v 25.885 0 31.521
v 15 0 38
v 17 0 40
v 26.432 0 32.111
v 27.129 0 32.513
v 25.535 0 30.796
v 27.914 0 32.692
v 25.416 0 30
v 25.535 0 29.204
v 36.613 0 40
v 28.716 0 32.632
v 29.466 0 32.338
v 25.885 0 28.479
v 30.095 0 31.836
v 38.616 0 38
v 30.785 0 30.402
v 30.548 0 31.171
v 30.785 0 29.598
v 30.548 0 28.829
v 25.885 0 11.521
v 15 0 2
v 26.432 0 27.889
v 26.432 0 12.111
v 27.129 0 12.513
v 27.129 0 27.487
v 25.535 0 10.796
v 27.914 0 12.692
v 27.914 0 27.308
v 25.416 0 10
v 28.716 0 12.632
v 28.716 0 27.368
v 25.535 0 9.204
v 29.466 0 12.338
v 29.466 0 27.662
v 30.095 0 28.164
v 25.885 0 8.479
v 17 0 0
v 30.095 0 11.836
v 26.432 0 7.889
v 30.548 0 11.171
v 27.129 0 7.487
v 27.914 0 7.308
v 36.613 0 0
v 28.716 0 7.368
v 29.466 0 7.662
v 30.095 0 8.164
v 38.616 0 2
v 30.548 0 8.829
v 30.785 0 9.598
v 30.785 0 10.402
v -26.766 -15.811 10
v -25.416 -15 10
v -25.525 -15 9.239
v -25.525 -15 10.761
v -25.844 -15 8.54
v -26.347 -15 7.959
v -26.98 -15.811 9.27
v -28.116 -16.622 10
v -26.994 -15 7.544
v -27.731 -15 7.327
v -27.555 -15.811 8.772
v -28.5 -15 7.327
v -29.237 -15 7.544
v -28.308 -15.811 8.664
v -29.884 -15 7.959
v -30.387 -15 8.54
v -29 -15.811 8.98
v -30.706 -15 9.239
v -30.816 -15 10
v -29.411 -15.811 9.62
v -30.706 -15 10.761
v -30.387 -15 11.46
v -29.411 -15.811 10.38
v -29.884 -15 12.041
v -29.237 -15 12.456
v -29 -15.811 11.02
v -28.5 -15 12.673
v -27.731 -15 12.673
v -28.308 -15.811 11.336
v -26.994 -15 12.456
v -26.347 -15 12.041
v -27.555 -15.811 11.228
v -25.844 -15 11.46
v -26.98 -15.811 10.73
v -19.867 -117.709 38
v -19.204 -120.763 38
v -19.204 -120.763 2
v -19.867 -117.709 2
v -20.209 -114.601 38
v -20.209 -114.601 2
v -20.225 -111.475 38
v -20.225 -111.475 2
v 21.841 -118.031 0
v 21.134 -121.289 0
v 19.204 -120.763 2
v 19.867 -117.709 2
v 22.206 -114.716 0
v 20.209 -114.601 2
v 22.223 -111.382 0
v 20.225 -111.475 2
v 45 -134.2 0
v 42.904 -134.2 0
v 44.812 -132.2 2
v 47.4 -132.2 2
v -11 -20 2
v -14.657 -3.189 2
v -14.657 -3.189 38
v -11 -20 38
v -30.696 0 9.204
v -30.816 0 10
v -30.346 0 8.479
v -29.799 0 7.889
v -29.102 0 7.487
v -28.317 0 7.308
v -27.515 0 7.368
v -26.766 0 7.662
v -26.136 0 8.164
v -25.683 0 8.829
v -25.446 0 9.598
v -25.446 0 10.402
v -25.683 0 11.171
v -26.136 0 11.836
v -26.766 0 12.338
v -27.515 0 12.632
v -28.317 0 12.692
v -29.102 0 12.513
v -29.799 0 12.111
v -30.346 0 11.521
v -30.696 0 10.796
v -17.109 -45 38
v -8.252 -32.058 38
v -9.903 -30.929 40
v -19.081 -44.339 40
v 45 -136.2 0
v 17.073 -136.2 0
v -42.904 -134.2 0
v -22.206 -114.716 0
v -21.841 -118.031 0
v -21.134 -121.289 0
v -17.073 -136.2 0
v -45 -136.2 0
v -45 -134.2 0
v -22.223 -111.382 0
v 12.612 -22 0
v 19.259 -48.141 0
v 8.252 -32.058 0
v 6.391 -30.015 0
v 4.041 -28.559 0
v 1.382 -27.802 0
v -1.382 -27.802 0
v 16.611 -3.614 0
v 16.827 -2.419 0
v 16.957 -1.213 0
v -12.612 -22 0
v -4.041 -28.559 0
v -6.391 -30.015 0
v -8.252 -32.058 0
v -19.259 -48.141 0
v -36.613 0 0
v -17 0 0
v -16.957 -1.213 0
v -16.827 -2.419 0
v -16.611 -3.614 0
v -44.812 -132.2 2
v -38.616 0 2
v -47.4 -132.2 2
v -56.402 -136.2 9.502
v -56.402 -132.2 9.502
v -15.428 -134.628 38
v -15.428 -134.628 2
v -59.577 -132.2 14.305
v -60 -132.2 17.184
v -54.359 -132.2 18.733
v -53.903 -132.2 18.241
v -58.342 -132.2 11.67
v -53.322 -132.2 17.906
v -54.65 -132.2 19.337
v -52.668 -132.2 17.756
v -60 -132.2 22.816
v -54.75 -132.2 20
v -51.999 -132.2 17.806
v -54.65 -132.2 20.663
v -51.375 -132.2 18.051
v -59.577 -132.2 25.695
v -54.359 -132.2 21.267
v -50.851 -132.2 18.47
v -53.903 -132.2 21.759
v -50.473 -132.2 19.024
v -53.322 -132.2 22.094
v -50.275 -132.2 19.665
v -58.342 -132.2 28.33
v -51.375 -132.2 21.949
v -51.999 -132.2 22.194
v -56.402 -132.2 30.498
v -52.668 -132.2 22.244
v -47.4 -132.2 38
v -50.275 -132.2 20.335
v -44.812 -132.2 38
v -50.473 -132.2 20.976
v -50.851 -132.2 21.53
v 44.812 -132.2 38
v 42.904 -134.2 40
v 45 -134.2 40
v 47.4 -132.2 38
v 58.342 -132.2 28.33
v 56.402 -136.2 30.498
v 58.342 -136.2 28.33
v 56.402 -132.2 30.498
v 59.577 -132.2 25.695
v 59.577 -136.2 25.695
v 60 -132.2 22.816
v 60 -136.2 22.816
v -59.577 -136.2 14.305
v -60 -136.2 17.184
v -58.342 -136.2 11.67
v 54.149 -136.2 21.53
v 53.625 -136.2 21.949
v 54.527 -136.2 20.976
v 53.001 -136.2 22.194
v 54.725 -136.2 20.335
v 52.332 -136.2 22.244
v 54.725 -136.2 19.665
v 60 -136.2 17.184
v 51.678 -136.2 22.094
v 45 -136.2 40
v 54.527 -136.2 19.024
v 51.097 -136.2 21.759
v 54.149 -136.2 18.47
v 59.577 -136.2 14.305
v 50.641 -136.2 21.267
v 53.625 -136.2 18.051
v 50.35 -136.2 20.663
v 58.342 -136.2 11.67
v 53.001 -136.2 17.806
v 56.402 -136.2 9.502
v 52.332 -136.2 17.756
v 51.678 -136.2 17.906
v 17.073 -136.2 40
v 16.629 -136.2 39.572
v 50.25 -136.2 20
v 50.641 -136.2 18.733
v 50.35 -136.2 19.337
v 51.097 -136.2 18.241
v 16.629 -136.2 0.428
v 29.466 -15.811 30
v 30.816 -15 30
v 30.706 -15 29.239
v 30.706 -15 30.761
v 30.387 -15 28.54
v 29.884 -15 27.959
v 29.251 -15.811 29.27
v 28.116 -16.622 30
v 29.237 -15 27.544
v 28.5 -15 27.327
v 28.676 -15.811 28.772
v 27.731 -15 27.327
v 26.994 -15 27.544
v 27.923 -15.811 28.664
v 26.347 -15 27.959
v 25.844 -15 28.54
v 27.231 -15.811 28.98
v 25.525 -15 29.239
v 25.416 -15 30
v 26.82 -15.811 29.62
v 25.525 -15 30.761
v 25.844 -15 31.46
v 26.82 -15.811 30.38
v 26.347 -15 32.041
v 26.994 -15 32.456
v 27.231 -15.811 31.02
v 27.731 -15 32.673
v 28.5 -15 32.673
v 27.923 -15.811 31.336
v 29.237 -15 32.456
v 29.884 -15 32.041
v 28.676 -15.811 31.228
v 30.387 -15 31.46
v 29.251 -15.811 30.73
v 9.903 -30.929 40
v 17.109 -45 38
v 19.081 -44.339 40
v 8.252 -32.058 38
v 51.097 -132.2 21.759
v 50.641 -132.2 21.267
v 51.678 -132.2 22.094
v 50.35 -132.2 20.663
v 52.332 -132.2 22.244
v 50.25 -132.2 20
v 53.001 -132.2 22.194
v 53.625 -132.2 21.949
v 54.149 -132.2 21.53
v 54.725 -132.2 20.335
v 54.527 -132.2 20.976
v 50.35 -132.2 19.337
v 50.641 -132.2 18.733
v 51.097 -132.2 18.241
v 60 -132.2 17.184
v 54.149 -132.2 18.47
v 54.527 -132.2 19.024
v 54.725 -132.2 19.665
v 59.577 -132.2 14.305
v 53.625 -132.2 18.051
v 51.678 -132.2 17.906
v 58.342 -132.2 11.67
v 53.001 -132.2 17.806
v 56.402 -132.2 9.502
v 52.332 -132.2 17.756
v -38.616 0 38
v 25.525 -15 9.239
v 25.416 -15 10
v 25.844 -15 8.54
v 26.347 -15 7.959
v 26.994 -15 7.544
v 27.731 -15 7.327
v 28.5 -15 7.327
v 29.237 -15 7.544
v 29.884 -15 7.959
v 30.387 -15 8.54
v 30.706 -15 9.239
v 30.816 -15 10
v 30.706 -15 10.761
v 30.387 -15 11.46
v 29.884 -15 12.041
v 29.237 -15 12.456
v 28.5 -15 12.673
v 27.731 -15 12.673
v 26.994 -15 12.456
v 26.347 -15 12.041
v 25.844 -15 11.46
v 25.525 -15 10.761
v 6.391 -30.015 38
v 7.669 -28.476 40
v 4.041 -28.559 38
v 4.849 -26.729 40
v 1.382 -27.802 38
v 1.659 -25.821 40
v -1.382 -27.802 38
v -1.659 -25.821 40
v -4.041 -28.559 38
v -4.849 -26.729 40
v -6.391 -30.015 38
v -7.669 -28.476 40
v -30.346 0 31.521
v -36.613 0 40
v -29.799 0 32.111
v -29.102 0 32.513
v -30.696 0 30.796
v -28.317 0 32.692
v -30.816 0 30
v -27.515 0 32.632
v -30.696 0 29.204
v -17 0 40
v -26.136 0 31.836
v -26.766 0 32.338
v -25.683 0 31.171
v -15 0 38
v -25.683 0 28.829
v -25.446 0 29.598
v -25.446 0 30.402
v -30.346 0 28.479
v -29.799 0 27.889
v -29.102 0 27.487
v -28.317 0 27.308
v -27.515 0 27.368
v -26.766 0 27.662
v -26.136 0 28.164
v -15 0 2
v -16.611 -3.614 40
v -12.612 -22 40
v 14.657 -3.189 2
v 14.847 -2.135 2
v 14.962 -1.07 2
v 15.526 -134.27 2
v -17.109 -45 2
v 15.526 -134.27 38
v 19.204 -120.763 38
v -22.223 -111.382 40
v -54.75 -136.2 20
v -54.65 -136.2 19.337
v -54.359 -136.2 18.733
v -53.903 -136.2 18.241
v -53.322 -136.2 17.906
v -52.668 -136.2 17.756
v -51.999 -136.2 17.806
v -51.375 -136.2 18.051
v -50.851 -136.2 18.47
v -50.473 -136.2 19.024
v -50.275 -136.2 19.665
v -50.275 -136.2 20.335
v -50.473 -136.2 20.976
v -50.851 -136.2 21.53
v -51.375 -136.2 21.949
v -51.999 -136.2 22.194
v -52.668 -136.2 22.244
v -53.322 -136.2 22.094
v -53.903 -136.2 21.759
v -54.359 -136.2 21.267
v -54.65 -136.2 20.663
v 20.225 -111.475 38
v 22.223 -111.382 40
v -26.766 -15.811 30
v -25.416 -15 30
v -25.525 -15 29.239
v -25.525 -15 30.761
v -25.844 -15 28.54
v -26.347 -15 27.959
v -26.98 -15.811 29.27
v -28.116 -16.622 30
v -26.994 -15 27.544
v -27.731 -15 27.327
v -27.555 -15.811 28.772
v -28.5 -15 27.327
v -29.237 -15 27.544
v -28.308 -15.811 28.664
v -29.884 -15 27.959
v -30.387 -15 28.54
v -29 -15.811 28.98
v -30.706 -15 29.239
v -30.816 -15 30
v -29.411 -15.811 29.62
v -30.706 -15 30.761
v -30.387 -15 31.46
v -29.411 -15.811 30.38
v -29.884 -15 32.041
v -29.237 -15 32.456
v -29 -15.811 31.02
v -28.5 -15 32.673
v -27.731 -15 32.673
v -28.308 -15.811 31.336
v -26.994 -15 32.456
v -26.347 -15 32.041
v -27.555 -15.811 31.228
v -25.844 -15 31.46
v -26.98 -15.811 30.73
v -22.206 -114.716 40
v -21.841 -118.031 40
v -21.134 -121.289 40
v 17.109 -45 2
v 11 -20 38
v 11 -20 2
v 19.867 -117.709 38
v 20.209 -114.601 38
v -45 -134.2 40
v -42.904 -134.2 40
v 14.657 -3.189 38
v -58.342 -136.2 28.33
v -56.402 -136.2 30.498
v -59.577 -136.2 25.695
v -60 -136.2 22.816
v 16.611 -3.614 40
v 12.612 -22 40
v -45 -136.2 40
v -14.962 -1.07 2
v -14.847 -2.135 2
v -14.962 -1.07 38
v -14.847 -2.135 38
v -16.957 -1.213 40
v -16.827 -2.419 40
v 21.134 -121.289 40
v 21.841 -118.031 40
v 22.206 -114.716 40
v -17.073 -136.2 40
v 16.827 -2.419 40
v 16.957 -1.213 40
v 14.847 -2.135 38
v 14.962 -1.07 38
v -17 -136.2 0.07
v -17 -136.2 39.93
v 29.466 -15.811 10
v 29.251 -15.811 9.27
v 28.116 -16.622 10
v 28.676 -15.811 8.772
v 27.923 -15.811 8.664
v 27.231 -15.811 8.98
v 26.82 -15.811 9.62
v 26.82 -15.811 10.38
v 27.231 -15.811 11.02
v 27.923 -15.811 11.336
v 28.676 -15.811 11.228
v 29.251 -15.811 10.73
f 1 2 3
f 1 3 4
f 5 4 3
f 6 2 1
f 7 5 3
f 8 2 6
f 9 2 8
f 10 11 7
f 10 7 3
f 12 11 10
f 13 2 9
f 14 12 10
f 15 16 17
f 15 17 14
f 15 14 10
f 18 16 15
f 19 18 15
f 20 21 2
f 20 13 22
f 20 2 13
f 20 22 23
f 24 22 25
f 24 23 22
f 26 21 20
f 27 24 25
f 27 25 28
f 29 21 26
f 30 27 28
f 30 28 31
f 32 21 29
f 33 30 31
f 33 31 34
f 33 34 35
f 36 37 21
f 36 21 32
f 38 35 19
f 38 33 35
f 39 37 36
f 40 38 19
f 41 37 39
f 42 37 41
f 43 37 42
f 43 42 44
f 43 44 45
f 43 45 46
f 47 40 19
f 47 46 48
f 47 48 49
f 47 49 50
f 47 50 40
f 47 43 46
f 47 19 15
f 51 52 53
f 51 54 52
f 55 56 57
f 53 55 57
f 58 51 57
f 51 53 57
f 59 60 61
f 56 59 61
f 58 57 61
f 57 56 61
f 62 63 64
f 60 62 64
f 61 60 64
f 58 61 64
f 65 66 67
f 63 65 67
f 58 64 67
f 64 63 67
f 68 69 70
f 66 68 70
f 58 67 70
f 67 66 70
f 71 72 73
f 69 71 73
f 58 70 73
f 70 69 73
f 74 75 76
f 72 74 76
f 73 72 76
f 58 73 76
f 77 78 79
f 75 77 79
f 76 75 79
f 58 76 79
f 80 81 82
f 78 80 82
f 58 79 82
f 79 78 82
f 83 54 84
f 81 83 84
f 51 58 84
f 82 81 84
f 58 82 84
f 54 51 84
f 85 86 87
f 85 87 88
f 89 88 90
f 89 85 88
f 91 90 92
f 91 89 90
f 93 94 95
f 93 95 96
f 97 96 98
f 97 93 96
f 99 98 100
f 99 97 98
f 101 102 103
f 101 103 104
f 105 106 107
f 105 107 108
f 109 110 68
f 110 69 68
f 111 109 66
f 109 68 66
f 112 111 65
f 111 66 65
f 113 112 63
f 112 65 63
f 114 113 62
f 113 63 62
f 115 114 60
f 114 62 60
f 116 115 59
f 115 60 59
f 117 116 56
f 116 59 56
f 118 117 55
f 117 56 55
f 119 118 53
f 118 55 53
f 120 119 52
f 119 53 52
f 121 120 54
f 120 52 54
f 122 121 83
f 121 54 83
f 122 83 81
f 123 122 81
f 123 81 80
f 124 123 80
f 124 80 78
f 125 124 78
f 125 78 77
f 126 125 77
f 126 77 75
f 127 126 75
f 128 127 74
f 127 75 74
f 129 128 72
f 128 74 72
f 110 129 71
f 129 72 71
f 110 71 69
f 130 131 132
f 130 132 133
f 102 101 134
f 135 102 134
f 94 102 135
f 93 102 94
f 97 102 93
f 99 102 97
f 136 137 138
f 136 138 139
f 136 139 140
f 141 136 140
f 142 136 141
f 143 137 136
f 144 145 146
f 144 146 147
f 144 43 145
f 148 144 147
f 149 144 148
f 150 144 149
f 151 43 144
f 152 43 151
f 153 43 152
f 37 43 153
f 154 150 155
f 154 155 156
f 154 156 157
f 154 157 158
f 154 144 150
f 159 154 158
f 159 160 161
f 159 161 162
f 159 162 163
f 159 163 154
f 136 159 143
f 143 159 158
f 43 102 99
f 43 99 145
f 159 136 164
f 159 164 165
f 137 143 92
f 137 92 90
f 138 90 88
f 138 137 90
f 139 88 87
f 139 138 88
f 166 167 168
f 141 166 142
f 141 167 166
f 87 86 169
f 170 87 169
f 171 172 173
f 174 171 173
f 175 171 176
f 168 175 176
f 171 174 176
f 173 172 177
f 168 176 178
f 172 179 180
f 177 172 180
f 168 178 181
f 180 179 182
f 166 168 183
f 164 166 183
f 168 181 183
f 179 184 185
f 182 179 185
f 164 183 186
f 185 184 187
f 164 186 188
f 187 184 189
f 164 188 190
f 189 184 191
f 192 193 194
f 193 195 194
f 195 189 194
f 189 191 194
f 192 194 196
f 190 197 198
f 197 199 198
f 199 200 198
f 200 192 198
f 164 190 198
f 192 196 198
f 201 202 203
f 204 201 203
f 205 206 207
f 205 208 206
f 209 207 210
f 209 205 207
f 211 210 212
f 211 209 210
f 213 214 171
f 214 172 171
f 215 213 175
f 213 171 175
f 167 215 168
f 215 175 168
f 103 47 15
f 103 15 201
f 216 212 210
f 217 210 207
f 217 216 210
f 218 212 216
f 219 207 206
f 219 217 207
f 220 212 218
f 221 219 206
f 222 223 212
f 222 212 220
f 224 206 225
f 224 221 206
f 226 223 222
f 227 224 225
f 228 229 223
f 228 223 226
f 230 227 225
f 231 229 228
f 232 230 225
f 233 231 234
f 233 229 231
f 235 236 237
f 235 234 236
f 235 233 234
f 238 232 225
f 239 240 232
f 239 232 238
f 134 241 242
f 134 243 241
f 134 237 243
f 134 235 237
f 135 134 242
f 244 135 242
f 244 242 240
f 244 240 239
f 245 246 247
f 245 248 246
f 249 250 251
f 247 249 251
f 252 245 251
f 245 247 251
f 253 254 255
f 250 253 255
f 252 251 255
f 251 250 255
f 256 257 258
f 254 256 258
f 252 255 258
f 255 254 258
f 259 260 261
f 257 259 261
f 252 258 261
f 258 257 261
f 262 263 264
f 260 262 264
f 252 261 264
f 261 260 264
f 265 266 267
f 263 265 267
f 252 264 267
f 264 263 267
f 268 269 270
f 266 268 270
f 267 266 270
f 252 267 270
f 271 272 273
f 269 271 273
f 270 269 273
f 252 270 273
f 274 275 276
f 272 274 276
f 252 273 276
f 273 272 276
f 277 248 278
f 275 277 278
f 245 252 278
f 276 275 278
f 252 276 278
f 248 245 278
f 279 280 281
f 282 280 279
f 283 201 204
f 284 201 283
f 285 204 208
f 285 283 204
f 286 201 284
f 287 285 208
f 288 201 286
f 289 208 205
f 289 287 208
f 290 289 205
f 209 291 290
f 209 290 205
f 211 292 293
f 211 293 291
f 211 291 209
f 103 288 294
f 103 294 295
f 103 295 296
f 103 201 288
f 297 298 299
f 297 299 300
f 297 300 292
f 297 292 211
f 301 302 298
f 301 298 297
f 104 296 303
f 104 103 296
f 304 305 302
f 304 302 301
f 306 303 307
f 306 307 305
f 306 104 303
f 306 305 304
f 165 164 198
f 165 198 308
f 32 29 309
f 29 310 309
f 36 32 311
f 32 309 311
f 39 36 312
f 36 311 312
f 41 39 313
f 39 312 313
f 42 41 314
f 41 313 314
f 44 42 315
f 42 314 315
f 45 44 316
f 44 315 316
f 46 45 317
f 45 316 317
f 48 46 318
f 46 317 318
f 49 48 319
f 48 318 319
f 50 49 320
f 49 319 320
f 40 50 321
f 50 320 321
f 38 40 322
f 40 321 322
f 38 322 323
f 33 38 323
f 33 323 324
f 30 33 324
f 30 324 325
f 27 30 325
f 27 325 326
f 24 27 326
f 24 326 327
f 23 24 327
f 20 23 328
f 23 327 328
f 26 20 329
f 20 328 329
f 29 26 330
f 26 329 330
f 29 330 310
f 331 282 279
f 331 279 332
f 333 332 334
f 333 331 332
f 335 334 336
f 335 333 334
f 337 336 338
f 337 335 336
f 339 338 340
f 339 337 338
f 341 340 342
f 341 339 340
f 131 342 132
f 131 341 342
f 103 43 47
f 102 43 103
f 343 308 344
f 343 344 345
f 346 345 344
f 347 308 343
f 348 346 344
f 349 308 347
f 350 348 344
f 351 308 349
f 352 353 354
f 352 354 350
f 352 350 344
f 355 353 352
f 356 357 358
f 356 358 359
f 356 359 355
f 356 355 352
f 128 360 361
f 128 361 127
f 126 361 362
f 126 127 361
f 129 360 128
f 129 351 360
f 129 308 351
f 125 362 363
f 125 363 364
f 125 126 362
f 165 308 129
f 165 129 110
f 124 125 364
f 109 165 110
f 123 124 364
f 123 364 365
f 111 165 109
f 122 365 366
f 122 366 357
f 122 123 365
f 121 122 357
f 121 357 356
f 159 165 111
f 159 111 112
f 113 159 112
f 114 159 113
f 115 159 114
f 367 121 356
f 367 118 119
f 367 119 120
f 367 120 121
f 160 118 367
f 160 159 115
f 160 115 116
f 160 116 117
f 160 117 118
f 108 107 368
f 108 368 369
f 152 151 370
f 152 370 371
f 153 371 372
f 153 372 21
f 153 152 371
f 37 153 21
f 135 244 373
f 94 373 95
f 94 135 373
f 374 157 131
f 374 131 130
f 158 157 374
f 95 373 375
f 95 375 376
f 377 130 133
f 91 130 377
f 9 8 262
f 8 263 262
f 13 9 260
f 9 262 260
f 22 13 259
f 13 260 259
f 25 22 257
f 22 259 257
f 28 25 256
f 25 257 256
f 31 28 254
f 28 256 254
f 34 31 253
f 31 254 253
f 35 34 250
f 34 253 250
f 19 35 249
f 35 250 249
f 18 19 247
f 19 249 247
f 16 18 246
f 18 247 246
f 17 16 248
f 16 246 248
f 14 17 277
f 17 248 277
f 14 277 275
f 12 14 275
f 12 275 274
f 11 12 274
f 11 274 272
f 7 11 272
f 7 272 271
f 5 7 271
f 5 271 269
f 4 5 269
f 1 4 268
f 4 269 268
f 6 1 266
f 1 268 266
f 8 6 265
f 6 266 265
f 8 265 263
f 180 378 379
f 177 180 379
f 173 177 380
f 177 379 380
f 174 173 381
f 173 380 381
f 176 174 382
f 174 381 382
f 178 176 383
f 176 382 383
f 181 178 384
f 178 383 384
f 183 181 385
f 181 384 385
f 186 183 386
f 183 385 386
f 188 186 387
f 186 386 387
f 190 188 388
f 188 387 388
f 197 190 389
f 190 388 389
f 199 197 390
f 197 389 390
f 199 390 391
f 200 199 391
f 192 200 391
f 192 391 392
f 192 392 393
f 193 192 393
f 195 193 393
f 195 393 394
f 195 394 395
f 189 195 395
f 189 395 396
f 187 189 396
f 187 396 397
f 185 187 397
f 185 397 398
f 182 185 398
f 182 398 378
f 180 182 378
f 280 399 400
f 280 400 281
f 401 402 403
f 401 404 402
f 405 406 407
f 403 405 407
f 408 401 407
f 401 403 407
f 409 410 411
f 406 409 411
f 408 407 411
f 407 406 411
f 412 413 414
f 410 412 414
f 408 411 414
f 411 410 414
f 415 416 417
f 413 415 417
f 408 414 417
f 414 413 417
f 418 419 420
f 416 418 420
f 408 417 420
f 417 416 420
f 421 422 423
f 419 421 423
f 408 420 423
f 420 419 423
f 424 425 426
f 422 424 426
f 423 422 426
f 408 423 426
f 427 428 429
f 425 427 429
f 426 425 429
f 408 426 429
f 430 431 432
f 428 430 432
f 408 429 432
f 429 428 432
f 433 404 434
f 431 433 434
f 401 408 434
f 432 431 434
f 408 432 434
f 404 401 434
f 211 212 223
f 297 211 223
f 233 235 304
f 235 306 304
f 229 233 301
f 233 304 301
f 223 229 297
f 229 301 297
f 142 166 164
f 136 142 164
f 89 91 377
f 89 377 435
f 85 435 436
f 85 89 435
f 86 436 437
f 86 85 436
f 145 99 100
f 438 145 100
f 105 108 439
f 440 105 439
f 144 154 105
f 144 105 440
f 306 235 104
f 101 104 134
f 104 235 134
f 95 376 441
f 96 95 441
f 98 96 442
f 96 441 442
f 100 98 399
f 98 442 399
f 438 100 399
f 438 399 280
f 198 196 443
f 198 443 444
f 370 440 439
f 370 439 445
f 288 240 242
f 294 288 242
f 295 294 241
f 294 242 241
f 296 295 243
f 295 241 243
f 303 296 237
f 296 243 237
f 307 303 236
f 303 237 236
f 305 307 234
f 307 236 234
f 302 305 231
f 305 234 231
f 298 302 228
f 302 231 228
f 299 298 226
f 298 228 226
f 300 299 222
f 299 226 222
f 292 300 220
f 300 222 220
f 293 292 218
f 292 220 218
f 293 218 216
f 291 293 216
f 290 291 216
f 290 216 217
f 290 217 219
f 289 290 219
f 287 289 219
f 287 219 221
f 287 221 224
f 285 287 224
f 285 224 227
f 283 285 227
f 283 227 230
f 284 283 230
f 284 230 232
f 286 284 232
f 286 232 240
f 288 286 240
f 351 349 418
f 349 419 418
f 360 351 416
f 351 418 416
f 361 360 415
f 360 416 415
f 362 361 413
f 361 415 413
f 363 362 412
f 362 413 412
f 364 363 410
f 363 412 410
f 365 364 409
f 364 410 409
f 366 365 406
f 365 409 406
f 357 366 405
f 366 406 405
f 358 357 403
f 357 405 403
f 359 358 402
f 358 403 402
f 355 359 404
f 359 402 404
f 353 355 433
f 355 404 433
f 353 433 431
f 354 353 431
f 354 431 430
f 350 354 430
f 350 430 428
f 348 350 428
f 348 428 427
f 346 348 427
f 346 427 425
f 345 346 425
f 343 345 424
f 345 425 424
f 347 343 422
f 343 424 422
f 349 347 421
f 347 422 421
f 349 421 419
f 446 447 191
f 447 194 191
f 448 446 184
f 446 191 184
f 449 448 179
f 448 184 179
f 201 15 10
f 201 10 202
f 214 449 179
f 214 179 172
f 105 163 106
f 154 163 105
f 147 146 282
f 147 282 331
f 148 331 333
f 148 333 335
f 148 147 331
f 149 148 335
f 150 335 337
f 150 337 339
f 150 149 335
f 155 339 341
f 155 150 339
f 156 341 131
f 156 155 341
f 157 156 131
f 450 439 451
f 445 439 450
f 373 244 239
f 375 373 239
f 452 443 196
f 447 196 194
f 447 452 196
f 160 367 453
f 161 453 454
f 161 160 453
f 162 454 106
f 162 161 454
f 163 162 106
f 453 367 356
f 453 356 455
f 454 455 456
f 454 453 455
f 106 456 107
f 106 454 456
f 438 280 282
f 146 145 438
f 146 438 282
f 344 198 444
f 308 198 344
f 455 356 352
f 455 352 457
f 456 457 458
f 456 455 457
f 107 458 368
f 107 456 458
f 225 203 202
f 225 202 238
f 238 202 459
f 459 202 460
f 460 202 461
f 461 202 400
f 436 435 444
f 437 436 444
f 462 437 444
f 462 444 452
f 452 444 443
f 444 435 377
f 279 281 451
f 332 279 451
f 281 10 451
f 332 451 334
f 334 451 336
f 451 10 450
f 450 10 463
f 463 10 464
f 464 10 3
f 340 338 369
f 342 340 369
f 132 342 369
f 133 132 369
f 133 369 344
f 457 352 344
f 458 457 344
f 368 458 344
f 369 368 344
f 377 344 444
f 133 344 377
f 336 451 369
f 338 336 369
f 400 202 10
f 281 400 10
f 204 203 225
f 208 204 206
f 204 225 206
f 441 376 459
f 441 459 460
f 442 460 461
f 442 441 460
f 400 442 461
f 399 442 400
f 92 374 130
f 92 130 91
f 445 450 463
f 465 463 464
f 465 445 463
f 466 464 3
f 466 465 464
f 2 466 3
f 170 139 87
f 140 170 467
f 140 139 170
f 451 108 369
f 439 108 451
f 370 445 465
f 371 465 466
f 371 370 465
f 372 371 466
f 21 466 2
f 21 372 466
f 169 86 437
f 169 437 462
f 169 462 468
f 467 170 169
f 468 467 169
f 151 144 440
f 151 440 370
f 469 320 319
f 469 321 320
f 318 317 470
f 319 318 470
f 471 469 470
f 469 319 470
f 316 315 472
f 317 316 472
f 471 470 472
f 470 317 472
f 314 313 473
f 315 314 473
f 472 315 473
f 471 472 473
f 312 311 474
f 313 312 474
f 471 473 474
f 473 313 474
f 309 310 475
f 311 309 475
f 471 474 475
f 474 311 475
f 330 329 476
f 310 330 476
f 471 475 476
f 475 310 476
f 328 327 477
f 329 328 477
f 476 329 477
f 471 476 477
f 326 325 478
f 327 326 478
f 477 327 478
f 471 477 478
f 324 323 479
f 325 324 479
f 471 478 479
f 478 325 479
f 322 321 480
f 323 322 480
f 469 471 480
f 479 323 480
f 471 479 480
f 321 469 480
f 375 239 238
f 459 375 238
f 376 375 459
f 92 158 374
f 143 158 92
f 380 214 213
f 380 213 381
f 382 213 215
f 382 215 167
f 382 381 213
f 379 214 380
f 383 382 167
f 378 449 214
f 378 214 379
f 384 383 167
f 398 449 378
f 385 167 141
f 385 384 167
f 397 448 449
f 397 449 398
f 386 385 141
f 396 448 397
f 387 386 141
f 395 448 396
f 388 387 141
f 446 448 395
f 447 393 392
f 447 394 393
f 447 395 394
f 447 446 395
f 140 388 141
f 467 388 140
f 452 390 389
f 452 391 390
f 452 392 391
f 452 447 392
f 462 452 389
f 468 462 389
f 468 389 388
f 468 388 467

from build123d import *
from OCP.BRepFilletAPI import BRepFilletAPI_MakeChamfer

# Parameters (mm, degrees)
ESTRUSIONE_ESTRUSIONE1_DEPTH = 40
FORO_PER_VITE_M4_1_D         = 5.4
FORO_PER_VITE_M4_1_DEPTH     = 15
FORO_PER_VITE_M4_1_TIP       = 1.622323671
ESTRUSIONE_ESTRUSIONE2_DEPTH = 4
FORO_PER_VITE_M4_2_D         = 4.5
FORO_PER_VITE_M4_2_DEPTH     = 80
FORO_PER_VITE_M4_2_TIP       = 1.351936393
RACCORDO1_R                  = 10
RACCORDO2_R                  = 30
SMUSSO1_SIZE                 = 2
SMUSSO1_SIZE2                = 1.629150908


with BuildPart() as part:
    # Schizzo1 → Estrusione-Estrusione1 (new body)
    with BuildSketch(Plane.XY):
        with BuildLine():
            Line((-14.657188407, -3.188546376), (-11, -20))
            Line((-11, -20), (11, -20))
            Line((11, -20), (14.657188407, -3.188546376))
            ThreePointArc((14.657188407, -3.188546376), (14.91405086, -1.603460927), (15, 0))
            Line((15, 0), (38.615528128, 0))
            Line((38.615528128, 0), (44.812497155, -132.20000012))
            Line((44.812497155, -132.20000012), (45, -132.20000012))
            Line((45, -132.20000012), (45, -136.20000012))
            Line((45, -136.20000012), (15, -136.20000012))
            Line((15, -136.20000012), (20.446957648, -116.20000012))
            Line((20.446957648, -116.20000012), (17.109407004, -45))
            Line((17.109407004, -45), (8.25243508, -32.058330072))
            ThreePointArc((8.25243508, -32.058330072), (0, -27.706100894), (-8.25243508, -32.058330072))
            Line((-8.25243508, -32.058330072), (-17.109407004, -45))
            Line((-17.109407004, -45), (-20.446957648, -116.20000012))
            Line((-20.446957648, -116.20000012), (-15, -136.20000012))
            Line((-15, -136.20000012), (-45, -136.20000012))
            Line((-45, -136.20000012), (-45, -132.20000012))
            Line((-45, -132.20000012), (-44.812497155, -132.20000012))
            Line((-44.812497155, -132.20000012), (-38.615528128, 0))
            Line((-38.615528128, 0), (-15, 0))
            ThreePointArc((-15, 0), (-14.91405086, -1.603460927), (-14.657188407, -3.188546376))
        make_face()
    extrude(amount=ESTRUSIONE_ESTRUSIONE1_DEPTH)

    # Foro per Vite M4-1
    with Locations(Plane(origin=(0, 0, 0), x_dir=(1, 0, 0), z_dir=(0, 1, 0))):
        with Locations((-28.115528128, -10), (-28.115528128, -30), (28.115528128, -30), (28.115528128, -10)):
            Hole(FORO_PER_VITE_M4_1_D / 2, depth=FORO_PER_VITE_M4_1_DEPTH)
            with Locations((0, 0, -(FORO_PER_VITE_M4_1_DEPTH + FORO_PER_VITE_M4_1_TIP / 2))):  # 118° drill point
                Cone(0, FORO_PER_VITE_M4_1_D / 2, FORO_PER_VITE_M4_1_TIP, mode=Mode.SUBTRACT)

    # Schizzo6 → Estrusione-Estrusione2 (add)
    with BuildSketch(Plane.XZ.offset(136.20000012)):
        Polygon((-45, 40), (-60, 27.5), (-60, 12.5), (-45, 0), align=None)
        Polygon((45, 40), (60, 27.5), (60, 12.5), (45, 0), align=None)
    extrude(amount=-ESTRUSIONE_ESTRUSIONE2_DEPTH)

    # Foro per Vite M4-2
    with Locations(Plane(origin=(0, -132.20000012, 0), x_dir=(1, 0, 0), z_dir=(0, 1, 0))):
        with Locations((-52.5, -20), (52.5, -20)):
            Hole(FORO_PER_VITE_M4_2_D / 2, depth=FORO_PER_VITE_M4_2_DEPTH)
            with Locations((0, 0, -(FORO_PER_VITE_M4_2_DEPTH + FORO_PER_VITE_M4_2_TIP / 2))):  # 118° drill point
                Cone(0, FORO_PER_VITE_M4_2_D / 2, FORO_PER_VITE_M4_2_TIP, mode=Mode.SUBTRACT)

    # Raccordo1
    raccordo1_edges = [part.edges().sort_by_distance(p)[0] for p in [
        (-60, -134.20000012, 12.5),
        (-60, -134.20000012, 27.5),
        (60, -134.20000012, 27.5),
        (60, -134.20000012, 12.5),
    ]]
    fillet(raccordo1_edges, radius=RACCORDO1_R)

    # Raccordo2
    raccordo2_edges = [part.edges().sort_by_distance(p)[0] for p in [
        (-20.446957648, -116.20000012, 20),
        (20.446957648, -116.20000012, 20),
    ]]
    fillet(raccordo2_edges, radius=RACCORDO2_R)

    # Smusso1: one chamfer whose edges measure the first distance from different faces: ONE call of the kernel's chamfer builder (chamfer() names one face for all edges)
    smusso1_edges_1 = [part.edges().sort_by_distance(p)[0] for p in [
        (-18.667449483, -78.237735256, 40),
        (12.680921042, -38.529165036, 40),
        (-12.680921042, -38.529165036, 40),
        (17.102049114, -128.481749861, 0),
        (17.102049114, -128.481749861, 40),
        (-17.102049114, -128.481749861, 0),
        (-17.102049114, -128.481749861, 40),
        (20.078629399, -116.159495492, 0),
        (20.078629399, -116.159495492, 40),
        (-20.078629399, -116.159495492, 0),
        (-20.078629399, -116.159495492, 40),
        (18.667449483, -78.237735256, 40),
        (-18.667449483, -78.237735256, 0),
        (-44.906248578, -132.20000012, 0),
        (-41.714012642, -66.10000006, 0),
        (-14.91405086, -1.603460927, 0),
        (-12.828594204, -11.594273188, 0),
        (0, -20, 0),
        (12.828594204, -11.594273188, 0),
        (14.91405086, -1.603460927, 0),
        (41.714012642, -66.10000006, 0),
        (44.906248578, -132.20000012, 0),
        (18.667449483, -78.237735256, 0),
        (44.906248578, -132.20000012, 40),
        (41.714012642, -66.10000006, 40),
        (14.91405086, -1.603460927, 40),
        (12.828594204, -11.594273188, 40),
        (0, -27.706100894, 40),
        (0, -20, 40),
        (-12.828594204, -11.594273188, 40),
        (-14.91405086, -1.603460927, 40),
        (-41.714012642, -66.10000006, 40),
        (-44.906248578, -132.20000012, 40),
    ]]
    smusso1_edges_2 = [part.edges().sort_by_distance(p)[0] for p in [
        (-15, -136.20000012, 20),
    ]]
    smusso1_side_2 = [part.faces().sort_by_distance(p)[0] for p in [
        (-35.203995695, -136.20000012, 20),
    ]]
    smusso1_edges_3 = [part.edges().sort_by_distance(p)[0] for p in [
        (15, -136.20000012, 20),
    ]]
    smusso1_side_3 = [part.faces().sort_by_distance(p)[0] for p in [
        (17.102049114, -128.481749861, 20),
    ]]
    smusso1 = BRepFilletAPI_MakeChamfer(part.part.solid().wrapped)
    for e in smusso1_edges_1:
        smusso1.Add(SMUSSO1_SIZE, e.wrapped)
    for e in smusso1_edges_2:
        smusso1.Add(SMUSSO1_SIZE, SMUSSO1_SIZE2, e.wrapped, smusso1_side_2[0].wrapped)  # the first distance lies on this face
    for e in smusso1_edges_3:
        smusso1.Add(SMUSSO1_SIZE, SMUSSO1_SIZE2, e.wrapped, smusso1_side_3[0].wrapped)  # the first distance lies on this face
    add(Compound.cast(smusso1.Shape()), mode=Mode.REPLACE)


solid = part.part
